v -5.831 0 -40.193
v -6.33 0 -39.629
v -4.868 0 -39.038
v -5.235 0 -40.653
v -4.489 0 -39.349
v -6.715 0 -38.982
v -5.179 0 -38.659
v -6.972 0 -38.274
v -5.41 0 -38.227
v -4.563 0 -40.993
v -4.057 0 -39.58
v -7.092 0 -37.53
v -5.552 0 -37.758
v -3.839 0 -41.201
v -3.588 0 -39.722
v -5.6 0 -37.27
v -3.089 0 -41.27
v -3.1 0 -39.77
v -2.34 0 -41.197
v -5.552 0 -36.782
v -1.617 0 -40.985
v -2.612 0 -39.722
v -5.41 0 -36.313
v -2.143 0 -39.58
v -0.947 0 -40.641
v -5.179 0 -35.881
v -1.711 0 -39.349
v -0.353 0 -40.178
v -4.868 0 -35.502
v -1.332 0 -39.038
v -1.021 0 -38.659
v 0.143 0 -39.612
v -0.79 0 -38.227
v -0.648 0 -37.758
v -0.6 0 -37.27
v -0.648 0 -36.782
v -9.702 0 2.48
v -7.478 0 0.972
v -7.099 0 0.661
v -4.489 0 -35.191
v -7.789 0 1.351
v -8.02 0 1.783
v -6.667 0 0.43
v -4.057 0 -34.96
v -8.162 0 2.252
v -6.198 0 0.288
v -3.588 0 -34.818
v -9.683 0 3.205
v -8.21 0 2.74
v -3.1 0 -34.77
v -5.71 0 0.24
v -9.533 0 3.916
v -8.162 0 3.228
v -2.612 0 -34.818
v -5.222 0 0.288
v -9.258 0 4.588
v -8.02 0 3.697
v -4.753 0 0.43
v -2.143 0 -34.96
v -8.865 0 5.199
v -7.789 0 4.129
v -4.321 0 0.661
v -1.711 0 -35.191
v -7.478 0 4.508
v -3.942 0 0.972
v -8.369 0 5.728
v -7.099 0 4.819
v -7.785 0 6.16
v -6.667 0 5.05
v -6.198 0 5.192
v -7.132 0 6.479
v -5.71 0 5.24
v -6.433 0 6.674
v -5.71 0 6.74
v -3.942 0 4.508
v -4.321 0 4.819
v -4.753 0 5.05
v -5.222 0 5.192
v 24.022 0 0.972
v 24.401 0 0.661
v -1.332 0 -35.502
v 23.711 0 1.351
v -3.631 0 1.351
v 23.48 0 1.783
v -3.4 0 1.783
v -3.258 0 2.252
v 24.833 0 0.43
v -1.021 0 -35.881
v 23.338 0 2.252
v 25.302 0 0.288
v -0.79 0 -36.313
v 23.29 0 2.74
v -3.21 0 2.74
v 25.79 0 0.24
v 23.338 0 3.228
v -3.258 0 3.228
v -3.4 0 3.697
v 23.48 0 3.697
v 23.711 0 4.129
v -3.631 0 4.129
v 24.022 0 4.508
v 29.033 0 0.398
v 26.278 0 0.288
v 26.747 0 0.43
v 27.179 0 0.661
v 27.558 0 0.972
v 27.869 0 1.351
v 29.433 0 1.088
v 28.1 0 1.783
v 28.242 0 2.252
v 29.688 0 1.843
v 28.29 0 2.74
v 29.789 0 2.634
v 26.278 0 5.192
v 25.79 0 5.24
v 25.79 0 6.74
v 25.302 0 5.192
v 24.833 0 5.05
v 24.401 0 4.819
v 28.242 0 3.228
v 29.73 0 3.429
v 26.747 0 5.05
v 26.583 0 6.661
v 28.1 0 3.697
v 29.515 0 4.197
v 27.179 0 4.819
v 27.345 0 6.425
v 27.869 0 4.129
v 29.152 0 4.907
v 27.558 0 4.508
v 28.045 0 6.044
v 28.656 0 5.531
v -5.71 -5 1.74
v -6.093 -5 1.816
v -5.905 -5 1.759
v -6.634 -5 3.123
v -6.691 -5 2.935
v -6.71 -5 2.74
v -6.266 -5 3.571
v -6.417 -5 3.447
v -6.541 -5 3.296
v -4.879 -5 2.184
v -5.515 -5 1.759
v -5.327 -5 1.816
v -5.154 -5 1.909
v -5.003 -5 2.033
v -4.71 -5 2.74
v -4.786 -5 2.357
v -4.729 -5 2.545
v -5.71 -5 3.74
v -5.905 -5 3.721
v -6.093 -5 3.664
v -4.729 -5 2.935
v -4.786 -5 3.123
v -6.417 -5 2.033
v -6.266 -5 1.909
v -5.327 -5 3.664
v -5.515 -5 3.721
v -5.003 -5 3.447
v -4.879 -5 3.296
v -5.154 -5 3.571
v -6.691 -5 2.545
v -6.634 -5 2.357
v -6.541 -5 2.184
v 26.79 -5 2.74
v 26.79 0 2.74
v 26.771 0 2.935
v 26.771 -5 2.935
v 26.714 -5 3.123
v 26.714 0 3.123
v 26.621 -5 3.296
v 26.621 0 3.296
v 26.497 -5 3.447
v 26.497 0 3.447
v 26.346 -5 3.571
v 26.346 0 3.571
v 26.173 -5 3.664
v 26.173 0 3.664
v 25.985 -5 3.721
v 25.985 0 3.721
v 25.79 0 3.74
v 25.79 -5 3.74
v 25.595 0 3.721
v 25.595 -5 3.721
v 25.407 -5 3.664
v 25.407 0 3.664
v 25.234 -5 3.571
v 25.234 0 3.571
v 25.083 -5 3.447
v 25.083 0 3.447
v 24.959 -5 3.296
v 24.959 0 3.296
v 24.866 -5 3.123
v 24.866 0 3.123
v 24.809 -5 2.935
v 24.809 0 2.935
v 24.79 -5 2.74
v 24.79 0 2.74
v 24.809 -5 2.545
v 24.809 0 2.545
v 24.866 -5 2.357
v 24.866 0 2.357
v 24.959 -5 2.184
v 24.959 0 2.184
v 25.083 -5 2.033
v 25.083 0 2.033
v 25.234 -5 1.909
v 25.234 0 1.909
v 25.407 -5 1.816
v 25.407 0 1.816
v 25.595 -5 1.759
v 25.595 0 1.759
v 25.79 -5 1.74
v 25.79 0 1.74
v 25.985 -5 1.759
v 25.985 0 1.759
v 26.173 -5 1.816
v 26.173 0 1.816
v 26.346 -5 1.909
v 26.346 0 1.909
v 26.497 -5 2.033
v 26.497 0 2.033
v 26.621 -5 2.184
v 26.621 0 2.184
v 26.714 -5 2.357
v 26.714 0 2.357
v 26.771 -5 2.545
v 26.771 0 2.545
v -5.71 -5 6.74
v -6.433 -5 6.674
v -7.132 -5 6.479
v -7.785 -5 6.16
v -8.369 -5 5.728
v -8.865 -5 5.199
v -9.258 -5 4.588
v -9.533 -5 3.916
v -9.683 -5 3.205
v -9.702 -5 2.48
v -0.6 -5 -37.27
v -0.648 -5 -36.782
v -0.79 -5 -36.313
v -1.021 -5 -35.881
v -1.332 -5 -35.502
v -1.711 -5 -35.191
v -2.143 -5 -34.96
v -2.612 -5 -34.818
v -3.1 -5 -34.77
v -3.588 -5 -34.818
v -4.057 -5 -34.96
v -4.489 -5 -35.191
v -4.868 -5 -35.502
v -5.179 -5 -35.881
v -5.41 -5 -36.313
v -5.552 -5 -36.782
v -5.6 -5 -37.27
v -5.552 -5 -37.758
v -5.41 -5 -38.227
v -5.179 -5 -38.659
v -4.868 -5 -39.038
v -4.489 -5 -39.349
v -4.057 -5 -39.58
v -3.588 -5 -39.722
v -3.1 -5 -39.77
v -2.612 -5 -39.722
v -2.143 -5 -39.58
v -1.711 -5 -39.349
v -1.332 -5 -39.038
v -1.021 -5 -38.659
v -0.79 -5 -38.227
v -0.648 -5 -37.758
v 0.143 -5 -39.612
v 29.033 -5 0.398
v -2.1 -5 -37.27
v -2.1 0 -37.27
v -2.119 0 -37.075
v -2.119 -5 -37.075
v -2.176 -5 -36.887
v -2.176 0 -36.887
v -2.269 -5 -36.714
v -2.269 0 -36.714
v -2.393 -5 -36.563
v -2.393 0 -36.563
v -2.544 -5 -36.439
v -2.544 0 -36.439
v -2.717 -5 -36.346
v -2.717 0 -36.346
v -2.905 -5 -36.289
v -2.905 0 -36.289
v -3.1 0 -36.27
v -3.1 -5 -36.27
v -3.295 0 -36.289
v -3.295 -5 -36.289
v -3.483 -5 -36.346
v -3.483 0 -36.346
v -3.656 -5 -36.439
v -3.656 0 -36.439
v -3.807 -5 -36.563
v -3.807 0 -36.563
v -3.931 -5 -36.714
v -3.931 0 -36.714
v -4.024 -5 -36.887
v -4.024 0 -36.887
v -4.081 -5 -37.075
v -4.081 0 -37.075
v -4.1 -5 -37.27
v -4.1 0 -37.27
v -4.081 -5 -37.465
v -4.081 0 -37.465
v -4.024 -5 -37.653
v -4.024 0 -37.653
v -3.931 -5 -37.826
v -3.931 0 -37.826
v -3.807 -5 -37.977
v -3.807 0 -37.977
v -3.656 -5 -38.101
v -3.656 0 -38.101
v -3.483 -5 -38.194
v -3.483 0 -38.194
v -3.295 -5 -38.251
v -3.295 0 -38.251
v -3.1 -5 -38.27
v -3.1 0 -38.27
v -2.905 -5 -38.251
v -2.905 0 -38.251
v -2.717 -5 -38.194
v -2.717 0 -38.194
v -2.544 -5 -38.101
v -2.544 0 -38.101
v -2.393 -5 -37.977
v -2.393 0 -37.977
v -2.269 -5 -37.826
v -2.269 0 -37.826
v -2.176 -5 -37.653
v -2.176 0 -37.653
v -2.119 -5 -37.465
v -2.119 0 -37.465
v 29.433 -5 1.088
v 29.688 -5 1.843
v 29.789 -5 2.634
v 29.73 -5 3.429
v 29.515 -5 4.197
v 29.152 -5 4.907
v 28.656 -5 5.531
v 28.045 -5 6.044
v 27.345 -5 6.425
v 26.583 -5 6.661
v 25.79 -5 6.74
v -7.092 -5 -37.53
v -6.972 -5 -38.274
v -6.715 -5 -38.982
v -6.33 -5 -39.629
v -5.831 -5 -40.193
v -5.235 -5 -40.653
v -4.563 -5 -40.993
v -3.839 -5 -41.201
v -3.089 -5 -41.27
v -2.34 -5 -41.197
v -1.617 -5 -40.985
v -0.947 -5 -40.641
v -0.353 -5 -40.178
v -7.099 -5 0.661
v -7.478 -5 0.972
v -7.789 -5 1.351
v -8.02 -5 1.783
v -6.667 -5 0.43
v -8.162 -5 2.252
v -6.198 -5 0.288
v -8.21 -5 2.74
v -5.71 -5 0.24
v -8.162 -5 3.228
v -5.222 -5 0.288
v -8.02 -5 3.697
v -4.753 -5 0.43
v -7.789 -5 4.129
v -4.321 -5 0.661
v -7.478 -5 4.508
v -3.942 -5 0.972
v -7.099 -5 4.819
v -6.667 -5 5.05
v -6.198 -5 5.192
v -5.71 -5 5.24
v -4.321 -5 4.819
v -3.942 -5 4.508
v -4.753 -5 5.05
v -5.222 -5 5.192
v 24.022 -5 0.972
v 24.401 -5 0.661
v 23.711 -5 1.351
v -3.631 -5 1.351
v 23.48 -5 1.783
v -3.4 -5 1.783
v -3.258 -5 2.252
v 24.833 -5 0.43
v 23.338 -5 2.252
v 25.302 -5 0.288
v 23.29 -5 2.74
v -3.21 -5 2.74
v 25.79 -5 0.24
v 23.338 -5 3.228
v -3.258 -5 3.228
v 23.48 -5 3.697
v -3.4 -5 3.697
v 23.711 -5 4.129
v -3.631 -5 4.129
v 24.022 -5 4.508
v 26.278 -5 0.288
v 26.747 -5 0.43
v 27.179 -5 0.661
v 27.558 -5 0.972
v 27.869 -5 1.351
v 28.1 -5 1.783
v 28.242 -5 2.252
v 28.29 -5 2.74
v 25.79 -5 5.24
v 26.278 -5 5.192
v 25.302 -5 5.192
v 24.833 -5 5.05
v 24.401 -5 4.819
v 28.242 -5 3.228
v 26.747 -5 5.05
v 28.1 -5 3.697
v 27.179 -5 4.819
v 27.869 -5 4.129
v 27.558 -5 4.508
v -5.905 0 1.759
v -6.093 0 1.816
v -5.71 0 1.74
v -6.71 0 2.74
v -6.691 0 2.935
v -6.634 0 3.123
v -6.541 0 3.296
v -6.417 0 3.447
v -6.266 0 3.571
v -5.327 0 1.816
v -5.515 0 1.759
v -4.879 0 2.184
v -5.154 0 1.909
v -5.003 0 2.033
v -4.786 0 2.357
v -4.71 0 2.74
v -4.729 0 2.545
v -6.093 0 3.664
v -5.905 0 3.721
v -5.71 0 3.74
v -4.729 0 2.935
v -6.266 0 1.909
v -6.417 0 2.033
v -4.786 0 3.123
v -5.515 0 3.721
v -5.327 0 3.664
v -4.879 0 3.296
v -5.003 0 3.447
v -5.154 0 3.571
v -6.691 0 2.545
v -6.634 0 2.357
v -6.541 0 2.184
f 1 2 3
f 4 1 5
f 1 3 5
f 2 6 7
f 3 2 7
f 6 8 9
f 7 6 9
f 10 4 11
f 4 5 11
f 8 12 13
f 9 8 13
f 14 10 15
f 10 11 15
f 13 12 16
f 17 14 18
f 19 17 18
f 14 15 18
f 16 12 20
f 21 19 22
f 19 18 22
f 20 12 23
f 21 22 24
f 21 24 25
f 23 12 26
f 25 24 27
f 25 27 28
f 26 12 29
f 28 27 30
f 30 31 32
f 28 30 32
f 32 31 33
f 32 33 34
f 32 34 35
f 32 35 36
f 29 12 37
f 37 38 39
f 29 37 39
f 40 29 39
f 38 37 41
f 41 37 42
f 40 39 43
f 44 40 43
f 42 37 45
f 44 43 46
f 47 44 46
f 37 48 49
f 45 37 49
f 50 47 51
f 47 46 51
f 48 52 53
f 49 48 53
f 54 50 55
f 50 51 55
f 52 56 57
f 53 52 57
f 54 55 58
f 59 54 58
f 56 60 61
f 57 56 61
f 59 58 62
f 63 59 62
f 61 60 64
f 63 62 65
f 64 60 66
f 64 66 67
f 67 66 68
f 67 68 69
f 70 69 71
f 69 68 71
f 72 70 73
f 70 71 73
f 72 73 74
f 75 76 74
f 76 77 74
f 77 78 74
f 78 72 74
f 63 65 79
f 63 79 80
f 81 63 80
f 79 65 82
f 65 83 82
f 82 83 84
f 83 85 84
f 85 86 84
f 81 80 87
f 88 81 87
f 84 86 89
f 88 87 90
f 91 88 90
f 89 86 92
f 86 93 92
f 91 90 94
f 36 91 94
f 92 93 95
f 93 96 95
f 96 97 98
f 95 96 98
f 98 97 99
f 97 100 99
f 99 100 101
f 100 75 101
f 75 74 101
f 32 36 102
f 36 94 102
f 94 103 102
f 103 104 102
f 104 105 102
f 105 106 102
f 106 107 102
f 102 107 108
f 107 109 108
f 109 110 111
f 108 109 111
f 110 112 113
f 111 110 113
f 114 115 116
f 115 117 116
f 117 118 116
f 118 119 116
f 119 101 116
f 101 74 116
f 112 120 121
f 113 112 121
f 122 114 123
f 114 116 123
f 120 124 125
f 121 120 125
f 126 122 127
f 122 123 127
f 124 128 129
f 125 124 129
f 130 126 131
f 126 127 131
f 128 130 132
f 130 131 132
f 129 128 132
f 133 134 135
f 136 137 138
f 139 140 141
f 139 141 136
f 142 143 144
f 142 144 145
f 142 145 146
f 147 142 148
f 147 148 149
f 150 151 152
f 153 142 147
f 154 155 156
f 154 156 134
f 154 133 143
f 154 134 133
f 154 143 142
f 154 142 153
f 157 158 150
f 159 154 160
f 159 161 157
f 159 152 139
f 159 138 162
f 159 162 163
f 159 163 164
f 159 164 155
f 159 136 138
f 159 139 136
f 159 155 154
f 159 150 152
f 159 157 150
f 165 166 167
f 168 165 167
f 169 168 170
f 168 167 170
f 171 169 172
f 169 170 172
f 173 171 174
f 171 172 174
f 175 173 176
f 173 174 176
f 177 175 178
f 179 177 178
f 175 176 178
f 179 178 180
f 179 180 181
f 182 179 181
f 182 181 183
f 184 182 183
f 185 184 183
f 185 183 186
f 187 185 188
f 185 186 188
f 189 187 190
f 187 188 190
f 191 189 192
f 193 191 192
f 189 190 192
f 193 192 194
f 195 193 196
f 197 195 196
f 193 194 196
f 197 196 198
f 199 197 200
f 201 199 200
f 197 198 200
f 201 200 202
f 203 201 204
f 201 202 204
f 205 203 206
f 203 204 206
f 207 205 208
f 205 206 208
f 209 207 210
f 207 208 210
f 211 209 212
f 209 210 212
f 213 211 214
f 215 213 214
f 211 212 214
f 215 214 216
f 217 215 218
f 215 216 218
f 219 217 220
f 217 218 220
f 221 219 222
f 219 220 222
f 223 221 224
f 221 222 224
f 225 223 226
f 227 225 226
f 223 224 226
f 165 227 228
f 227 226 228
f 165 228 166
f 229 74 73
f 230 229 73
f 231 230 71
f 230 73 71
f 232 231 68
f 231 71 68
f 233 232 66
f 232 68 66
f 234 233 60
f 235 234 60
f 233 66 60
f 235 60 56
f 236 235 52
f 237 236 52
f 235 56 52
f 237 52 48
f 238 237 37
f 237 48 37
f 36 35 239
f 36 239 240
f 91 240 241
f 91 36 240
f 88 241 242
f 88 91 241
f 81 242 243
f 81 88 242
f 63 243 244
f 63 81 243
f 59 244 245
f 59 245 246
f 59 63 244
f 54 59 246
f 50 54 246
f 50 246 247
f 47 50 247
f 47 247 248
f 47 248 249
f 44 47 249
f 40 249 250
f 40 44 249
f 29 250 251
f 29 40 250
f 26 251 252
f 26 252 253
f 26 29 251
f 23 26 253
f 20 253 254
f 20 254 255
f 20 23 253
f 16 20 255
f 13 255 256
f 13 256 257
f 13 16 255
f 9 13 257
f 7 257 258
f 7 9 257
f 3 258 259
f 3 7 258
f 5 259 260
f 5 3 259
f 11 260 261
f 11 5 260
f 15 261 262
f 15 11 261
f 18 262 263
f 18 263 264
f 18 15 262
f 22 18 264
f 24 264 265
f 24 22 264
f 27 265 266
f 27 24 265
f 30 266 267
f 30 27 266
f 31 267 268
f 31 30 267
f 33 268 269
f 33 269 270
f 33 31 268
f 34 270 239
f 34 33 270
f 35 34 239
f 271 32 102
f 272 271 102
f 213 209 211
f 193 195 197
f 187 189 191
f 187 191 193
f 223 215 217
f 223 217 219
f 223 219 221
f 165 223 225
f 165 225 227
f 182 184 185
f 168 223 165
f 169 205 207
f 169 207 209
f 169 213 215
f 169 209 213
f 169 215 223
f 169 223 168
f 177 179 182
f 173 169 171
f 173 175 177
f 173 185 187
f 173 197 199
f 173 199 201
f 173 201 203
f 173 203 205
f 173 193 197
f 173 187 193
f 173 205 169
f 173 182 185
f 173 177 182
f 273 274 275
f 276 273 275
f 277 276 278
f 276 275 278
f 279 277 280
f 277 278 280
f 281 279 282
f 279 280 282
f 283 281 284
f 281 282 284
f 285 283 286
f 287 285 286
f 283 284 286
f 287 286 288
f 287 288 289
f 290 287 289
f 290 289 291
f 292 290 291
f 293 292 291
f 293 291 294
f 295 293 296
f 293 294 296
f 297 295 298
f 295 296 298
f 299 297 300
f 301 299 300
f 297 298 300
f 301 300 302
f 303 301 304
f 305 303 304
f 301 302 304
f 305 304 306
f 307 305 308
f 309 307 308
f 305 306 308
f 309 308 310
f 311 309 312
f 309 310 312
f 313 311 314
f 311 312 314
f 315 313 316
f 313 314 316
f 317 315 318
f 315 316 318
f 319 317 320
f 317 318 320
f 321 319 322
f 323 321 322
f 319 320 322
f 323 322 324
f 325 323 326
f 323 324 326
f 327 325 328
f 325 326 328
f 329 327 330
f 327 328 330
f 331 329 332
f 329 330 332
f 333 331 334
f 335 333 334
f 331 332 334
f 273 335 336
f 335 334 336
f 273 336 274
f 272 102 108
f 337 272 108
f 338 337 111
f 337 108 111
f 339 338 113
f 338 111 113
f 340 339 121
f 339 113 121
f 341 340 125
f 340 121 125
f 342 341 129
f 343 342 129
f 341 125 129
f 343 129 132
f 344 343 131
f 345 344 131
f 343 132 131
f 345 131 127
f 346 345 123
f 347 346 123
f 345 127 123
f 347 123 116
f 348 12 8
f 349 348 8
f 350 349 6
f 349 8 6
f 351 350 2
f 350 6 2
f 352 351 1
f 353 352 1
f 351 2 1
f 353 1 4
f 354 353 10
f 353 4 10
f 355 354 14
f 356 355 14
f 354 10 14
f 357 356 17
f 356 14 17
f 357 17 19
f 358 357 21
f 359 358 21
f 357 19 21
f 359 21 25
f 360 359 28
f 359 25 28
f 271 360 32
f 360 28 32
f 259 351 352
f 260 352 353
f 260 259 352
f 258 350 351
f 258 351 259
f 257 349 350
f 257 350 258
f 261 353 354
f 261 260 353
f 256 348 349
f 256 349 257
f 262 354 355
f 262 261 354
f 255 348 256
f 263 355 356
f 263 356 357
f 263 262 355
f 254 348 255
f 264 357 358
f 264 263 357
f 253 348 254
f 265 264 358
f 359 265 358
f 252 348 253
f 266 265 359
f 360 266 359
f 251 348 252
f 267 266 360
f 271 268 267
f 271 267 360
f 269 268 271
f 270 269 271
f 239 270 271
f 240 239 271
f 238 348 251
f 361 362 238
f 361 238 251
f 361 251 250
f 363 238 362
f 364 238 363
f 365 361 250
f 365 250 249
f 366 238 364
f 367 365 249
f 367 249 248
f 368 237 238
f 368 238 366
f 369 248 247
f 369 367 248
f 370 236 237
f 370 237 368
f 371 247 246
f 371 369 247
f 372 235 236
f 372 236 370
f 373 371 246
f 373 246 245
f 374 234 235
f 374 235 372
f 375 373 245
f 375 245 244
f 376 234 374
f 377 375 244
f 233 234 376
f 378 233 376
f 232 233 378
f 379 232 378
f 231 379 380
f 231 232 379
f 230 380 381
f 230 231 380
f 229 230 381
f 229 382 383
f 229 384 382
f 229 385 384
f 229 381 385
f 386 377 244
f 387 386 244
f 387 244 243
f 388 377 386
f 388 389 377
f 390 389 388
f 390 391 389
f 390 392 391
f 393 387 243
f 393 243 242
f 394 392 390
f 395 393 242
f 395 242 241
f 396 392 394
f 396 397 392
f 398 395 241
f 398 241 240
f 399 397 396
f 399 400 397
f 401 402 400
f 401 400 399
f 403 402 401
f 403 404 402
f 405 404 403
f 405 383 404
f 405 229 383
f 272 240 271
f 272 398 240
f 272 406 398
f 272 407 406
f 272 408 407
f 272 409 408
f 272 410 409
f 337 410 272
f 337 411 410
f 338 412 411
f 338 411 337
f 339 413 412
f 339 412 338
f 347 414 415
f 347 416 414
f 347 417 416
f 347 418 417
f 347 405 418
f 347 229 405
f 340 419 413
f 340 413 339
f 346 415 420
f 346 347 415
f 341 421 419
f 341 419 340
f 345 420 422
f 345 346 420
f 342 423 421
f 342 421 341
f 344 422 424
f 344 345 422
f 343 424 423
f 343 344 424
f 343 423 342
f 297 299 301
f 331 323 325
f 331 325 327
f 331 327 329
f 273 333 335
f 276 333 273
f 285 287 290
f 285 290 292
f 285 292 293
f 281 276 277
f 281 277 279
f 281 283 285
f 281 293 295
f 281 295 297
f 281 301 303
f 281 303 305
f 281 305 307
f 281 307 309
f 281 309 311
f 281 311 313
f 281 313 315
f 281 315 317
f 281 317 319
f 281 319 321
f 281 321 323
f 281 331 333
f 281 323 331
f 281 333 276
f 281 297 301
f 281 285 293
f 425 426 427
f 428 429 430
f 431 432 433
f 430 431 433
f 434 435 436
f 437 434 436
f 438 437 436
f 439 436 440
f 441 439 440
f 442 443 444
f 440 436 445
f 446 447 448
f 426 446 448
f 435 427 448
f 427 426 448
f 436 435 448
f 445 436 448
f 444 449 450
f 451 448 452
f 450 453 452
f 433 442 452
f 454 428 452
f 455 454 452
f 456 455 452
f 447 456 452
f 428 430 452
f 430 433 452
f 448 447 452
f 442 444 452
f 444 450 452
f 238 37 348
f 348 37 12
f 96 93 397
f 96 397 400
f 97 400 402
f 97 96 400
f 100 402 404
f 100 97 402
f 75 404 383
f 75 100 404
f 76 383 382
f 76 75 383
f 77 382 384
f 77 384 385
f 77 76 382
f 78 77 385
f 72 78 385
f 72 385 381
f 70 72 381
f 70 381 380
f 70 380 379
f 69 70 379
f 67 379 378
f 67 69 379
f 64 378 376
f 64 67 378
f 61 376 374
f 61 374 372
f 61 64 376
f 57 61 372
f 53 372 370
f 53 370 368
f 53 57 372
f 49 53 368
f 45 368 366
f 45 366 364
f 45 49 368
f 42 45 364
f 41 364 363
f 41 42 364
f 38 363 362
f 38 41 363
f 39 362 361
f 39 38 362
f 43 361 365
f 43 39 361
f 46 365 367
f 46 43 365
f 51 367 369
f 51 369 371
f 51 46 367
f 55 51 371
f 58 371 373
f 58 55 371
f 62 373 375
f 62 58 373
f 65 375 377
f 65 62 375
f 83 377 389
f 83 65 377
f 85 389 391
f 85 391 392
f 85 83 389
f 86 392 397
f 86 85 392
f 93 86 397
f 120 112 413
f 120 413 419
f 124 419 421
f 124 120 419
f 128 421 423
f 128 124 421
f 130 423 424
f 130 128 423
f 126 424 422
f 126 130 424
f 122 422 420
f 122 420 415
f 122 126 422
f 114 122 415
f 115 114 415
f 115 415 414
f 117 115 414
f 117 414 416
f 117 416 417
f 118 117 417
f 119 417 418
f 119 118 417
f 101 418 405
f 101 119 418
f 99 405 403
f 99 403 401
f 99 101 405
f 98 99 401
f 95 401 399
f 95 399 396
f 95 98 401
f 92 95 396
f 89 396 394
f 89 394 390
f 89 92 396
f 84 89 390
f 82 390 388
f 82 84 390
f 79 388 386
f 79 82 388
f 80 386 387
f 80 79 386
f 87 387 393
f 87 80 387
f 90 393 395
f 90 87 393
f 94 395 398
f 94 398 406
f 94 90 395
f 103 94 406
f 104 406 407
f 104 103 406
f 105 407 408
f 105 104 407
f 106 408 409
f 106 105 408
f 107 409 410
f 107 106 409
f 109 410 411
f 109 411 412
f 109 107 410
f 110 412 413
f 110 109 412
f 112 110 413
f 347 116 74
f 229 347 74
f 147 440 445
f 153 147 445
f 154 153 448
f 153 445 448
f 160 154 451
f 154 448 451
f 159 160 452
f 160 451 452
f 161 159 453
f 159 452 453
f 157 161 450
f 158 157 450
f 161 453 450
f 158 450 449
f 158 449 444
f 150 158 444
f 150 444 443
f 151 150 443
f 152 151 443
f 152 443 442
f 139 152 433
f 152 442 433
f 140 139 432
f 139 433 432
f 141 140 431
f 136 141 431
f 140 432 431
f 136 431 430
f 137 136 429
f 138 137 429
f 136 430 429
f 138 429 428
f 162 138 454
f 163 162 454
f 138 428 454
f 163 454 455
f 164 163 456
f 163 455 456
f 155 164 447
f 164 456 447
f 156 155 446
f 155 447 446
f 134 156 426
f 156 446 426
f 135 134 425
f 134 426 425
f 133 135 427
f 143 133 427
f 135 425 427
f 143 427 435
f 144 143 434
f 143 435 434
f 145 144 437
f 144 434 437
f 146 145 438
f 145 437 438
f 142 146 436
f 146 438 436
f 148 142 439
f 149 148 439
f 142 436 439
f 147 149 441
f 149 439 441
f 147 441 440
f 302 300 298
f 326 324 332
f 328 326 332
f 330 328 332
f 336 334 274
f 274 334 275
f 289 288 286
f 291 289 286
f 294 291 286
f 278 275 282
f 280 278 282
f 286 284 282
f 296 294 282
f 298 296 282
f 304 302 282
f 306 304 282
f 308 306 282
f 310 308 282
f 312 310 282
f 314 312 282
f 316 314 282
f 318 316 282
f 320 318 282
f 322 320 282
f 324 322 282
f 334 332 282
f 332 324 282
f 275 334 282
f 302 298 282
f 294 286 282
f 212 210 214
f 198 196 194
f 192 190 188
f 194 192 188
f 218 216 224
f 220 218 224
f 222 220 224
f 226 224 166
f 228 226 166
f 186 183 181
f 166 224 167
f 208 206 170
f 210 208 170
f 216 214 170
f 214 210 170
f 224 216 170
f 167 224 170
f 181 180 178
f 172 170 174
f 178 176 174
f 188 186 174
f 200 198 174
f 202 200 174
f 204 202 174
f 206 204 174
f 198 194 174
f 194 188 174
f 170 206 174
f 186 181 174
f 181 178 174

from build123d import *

# Parameters (mm, degrees)
F0_R     = 2.5
F0_R_2   = 1
F1_DEPTH = 5


with BuildPart() as f1:
    # F0 (on Front) → F1 (new body)
    with BuildSketch(Plane.XZ):
        with BuildLine():
            Line((25.79, 6.74), (-5.71, 6.74))
            ThreePointArc((-5.71, 6.74), (-8.629035, 5.474819), (-9.701516, 2.479619))
            Line((-9.701516, 2.479619), (-7.091516, -37.530381))
            ThreePointArc((-7.091516, -37.530381), (-4.20589, -41.114087), (0.142952, -39.611637))
            Line((0.142952, -39.611637), (29.032952, 0.398363))
            ThreePointArc((29.032952, 0.398363), (29.351358, 4.561188), (25.79, 6.74))
        make_face()
        with Locations((-3.1, -37.27)):
            Circle(F0_R, mode=Mode.SUBTRACT)
        with Locations((-5.71, 2.74)):
            Circle(F0_R, mode=Mode.SUBTRACT)
        with Locations((25.79, 2.74)):
            Circle(F0_R, mode=Mode.SUBTRACT)
        with Locations((-5.71, 2.74)):
            Circle(F0_R_2)
        with Locations((25.79, 2.74)):
            Circle(F0_R_2)
        with Locations((-3.1, -37.27)):
            Circle(F0_R_2)
    extrude(amount=F1_DEPTH)


solid = f1.part
